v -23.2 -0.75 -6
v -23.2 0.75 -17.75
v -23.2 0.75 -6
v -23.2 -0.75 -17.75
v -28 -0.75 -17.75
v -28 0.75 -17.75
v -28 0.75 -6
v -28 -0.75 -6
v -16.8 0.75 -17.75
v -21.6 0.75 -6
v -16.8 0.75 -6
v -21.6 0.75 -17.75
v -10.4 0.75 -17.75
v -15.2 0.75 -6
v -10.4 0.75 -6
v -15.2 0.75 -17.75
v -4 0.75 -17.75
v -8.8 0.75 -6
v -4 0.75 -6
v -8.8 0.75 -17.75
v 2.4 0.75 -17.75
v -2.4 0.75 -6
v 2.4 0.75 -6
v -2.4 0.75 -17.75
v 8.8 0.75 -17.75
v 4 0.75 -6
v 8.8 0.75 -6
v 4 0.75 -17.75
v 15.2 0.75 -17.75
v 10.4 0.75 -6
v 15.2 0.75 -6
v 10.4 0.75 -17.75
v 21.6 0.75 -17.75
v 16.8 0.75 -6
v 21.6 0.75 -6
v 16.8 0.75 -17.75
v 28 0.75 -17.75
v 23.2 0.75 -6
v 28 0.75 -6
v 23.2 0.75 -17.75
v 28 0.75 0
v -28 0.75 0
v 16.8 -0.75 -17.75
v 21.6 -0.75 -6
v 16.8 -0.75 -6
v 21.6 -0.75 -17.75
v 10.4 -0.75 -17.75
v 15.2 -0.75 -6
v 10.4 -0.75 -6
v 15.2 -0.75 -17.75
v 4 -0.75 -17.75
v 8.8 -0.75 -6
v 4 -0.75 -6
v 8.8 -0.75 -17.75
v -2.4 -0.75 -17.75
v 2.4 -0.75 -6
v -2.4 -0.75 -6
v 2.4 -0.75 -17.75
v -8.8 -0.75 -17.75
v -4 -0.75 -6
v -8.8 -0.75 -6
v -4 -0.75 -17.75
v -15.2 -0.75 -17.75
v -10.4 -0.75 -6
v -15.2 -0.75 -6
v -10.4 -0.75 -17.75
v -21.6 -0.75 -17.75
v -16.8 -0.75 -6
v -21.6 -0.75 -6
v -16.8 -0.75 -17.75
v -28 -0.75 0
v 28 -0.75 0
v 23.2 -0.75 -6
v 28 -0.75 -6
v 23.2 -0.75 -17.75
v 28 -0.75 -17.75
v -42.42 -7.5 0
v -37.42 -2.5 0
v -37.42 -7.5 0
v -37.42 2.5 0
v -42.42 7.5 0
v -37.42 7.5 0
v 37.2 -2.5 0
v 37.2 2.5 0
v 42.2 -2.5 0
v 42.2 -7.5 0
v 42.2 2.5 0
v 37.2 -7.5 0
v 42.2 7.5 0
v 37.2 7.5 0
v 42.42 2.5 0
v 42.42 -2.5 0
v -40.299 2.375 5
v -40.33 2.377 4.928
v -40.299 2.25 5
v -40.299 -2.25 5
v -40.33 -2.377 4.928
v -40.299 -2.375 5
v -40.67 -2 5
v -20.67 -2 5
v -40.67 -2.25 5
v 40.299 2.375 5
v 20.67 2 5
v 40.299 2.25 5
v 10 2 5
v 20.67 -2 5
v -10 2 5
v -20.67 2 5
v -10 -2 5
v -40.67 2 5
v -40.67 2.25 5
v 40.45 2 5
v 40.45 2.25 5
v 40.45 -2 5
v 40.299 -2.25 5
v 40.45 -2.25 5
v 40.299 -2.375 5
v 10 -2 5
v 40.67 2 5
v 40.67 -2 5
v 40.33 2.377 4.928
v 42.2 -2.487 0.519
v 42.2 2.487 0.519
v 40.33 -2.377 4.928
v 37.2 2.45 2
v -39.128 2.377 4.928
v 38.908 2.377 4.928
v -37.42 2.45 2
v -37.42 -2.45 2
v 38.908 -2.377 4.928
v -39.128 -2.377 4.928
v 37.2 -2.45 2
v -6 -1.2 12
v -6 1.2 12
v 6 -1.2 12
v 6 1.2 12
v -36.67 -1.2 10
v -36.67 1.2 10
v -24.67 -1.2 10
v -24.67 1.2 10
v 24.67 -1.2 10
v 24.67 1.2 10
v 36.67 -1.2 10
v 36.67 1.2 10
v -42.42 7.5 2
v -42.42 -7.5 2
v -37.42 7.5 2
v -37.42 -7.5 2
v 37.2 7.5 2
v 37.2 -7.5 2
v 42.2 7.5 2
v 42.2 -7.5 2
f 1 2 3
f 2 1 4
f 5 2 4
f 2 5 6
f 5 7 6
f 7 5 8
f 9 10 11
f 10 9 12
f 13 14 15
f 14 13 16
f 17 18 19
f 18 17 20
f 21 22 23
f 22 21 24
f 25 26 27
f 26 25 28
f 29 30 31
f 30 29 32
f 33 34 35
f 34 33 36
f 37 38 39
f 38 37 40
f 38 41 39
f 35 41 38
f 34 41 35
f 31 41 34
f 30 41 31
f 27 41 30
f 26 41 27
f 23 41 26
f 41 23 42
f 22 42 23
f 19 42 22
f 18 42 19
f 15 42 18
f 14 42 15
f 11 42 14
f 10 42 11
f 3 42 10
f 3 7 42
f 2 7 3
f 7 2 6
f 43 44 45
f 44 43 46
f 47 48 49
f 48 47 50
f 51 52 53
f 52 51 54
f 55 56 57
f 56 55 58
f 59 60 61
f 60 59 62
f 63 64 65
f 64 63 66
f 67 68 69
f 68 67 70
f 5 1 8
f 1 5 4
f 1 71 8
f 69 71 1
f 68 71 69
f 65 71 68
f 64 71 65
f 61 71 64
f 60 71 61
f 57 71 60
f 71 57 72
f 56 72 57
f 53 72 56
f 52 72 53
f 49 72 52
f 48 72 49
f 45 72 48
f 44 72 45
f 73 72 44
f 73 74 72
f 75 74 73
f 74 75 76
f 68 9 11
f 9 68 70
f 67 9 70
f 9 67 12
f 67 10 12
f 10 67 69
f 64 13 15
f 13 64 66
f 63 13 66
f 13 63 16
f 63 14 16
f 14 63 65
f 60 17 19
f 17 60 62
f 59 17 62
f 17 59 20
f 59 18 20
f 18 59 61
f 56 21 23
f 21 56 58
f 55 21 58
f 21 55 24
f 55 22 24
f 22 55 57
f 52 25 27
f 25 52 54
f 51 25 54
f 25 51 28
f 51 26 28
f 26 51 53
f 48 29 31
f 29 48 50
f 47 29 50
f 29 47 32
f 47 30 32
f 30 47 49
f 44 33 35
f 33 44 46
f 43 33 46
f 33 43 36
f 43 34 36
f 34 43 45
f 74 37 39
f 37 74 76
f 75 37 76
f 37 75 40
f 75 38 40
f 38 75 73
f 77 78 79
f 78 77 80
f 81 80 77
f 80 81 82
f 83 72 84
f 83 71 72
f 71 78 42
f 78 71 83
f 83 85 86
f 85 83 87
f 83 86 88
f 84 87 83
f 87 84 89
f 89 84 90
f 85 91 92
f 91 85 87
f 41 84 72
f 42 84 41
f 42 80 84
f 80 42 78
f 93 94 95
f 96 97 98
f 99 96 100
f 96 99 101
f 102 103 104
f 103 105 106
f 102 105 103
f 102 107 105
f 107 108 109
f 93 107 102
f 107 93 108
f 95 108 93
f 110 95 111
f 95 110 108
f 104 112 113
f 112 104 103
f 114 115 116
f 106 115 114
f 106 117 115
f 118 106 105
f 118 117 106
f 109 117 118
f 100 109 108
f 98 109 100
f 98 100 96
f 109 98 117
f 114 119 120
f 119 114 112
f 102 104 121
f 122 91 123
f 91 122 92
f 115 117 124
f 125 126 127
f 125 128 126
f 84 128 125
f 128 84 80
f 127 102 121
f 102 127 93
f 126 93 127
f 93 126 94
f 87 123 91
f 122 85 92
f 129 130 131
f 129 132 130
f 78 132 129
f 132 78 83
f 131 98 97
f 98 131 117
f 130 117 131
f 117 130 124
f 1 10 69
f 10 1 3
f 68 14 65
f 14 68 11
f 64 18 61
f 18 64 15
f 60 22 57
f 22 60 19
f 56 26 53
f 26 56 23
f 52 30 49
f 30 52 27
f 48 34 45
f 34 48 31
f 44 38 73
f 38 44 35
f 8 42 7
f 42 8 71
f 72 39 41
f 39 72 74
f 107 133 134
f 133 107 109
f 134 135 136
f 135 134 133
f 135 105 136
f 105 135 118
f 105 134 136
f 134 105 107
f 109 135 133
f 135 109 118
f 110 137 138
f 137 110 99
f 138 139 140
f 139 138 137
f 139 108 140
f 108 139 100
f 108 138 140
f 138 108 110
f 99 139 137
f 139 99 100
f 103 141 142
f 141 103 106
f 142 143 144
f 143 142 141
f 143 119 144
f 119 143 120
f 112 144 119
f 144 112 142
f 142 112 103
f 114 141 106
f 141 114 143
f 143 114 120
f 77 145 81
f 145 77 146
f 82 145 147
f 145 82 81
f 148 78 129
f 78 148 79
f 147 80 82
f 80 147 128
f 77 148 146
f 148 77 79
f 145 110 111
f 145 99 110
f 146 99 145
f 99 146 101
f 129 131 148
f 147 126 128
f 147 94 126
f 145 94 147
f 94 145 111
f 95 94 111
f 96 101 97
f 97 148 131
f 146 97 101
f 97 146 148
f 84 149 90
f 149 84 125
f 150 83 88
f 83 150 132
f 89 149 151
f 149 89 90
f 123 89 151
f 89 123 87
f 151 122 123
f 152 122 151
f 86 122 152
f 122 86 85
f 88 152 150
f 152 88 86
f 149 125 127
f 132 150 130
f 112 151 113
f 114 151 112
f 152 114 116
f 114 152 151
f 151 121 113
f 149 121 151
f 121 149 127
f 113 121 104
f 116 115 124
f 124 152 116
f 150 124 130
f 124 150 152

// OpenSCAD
echo(version=version());
// Parameters used to generator model (Values are measured in mm)

tooth_count = 9; // Number of wells
tooth_width = 4.8; // Width of each tooth
tooth_thickness = 1.5; // Thickness of each tooth
tooth_gap = 1.6; // Spacing between teeth.
tooth_length = 17.75;  // Length of teeth (measured perpendicular from bottom of support)
text_label = ""; // Label or name you want to appear on the side
tooth_support = 6;// Height of upper support on teeth

// Include square blocks on bottom of support
locking_block_supports = "no"; // [yes, no]

//Main block of code
union() { 

// Primary support bar 
    translate([0, 0, 0])
    linear_extrude(height = 5, scale = 0.95)
    square([body_x, body_y], center = true);

// Teeth support  
    translate([0, 0, -tooth_support])
    linear_extrude(height = tooth_support)
    square([(tooth_width*tooth_count)+(tooth_gap*(tooth_count-1)), tooth_thickness], center = true);

//Handles
     // Handle Center
        translate([0, 0, body_z])
        linear_extrude(height = 7, scale = 0.6)
        square([20, 4], center = true);
    // Handle left
        translate([(-body_x/2)+11.75, 0, body_z])
        linear_extrude(height = 5, scale = 0.6)
        square([20, 4], center = true);
    // Handle right
        translate([(body_x/2)-11.75, 0, body_z])
        linear_extrude(height = 5, scale = 0.6)
        square([20, 4], center = true);

// Left support square
	// Support base 
        translate([(-body_x/2)+2.5, 0, 0])
    	linear_extrude(height = 2)
    	square([5, 15], center = true);
	// Angled Support
        translate([(-body_x/2)+2.5, 0, 2])
        linear_extrude(height = 3, scale = 0.3)
        square([5, 15], center = true);
    
// Right support square
	// Support base 
        translate([(body_x/2)-support_x, 0, 0])
    	linear_extrude(height = 2)
    	square([5, 15], center = true);
    // Angled Support
        translate([(body_x/2)-support_x, 0, 2])
        linear_extrude(height = 3, scale = 0.3)
        square([5, 15], center = true);

// Text placed on body of comb
    logo(text_label); 

// Locking Blocks.
	if(locking_block_supports == "yes")
	{
    
    // Right
        translate([(body_x/2)-support_x, 0, -support_z]) linear_extrude(height = support_z) square([support_x, support_y], center = false); 

    // Left
        translate([-body_x/2, 0, -support_z]) linear_extrude(height = support_z) square([support_x, support_y], center = false); 
	}

//Teeth
	translate([tooth_margin, 0, -tooth_length/2]) union() {
		for(i = [0:tooth_count-1]) {
			translate([i * (tooth_width + tooth_gap), 0, 0]) 
            cube([tooth_width, tooth_thickness, tooth_length], center=true);
		}
	}
}

body_x = 84.84;
body_z = 5;
body_y = 5;

support_x = 2.72;
support_y = 2.55;
support_z = 2.64;

tooth_margin = -(((tooth_count-1)*tooth_width)/2+((tooth_count-1)*tooth_gap)/2); 

module logo(t, s = 2.5, style = "") {
  translate([0, -body_y/2+.75, 1])
    rotate([90, 0, 0]) color("red")
    linear_extrude(height = 1)
    text(t, size = s, font = str("Liberation Sans", style),  halign = "center");
}
/*
* Customizable Electrophoresis Comb
* 
* Copyright (c) 2016 Adm Chrysler
* www.admchrysler.com / chrysler@cornell.edu
* Licensed under the Creative Commons
* Attribution - Non-Commercial - Share Alike license.
*
*/
